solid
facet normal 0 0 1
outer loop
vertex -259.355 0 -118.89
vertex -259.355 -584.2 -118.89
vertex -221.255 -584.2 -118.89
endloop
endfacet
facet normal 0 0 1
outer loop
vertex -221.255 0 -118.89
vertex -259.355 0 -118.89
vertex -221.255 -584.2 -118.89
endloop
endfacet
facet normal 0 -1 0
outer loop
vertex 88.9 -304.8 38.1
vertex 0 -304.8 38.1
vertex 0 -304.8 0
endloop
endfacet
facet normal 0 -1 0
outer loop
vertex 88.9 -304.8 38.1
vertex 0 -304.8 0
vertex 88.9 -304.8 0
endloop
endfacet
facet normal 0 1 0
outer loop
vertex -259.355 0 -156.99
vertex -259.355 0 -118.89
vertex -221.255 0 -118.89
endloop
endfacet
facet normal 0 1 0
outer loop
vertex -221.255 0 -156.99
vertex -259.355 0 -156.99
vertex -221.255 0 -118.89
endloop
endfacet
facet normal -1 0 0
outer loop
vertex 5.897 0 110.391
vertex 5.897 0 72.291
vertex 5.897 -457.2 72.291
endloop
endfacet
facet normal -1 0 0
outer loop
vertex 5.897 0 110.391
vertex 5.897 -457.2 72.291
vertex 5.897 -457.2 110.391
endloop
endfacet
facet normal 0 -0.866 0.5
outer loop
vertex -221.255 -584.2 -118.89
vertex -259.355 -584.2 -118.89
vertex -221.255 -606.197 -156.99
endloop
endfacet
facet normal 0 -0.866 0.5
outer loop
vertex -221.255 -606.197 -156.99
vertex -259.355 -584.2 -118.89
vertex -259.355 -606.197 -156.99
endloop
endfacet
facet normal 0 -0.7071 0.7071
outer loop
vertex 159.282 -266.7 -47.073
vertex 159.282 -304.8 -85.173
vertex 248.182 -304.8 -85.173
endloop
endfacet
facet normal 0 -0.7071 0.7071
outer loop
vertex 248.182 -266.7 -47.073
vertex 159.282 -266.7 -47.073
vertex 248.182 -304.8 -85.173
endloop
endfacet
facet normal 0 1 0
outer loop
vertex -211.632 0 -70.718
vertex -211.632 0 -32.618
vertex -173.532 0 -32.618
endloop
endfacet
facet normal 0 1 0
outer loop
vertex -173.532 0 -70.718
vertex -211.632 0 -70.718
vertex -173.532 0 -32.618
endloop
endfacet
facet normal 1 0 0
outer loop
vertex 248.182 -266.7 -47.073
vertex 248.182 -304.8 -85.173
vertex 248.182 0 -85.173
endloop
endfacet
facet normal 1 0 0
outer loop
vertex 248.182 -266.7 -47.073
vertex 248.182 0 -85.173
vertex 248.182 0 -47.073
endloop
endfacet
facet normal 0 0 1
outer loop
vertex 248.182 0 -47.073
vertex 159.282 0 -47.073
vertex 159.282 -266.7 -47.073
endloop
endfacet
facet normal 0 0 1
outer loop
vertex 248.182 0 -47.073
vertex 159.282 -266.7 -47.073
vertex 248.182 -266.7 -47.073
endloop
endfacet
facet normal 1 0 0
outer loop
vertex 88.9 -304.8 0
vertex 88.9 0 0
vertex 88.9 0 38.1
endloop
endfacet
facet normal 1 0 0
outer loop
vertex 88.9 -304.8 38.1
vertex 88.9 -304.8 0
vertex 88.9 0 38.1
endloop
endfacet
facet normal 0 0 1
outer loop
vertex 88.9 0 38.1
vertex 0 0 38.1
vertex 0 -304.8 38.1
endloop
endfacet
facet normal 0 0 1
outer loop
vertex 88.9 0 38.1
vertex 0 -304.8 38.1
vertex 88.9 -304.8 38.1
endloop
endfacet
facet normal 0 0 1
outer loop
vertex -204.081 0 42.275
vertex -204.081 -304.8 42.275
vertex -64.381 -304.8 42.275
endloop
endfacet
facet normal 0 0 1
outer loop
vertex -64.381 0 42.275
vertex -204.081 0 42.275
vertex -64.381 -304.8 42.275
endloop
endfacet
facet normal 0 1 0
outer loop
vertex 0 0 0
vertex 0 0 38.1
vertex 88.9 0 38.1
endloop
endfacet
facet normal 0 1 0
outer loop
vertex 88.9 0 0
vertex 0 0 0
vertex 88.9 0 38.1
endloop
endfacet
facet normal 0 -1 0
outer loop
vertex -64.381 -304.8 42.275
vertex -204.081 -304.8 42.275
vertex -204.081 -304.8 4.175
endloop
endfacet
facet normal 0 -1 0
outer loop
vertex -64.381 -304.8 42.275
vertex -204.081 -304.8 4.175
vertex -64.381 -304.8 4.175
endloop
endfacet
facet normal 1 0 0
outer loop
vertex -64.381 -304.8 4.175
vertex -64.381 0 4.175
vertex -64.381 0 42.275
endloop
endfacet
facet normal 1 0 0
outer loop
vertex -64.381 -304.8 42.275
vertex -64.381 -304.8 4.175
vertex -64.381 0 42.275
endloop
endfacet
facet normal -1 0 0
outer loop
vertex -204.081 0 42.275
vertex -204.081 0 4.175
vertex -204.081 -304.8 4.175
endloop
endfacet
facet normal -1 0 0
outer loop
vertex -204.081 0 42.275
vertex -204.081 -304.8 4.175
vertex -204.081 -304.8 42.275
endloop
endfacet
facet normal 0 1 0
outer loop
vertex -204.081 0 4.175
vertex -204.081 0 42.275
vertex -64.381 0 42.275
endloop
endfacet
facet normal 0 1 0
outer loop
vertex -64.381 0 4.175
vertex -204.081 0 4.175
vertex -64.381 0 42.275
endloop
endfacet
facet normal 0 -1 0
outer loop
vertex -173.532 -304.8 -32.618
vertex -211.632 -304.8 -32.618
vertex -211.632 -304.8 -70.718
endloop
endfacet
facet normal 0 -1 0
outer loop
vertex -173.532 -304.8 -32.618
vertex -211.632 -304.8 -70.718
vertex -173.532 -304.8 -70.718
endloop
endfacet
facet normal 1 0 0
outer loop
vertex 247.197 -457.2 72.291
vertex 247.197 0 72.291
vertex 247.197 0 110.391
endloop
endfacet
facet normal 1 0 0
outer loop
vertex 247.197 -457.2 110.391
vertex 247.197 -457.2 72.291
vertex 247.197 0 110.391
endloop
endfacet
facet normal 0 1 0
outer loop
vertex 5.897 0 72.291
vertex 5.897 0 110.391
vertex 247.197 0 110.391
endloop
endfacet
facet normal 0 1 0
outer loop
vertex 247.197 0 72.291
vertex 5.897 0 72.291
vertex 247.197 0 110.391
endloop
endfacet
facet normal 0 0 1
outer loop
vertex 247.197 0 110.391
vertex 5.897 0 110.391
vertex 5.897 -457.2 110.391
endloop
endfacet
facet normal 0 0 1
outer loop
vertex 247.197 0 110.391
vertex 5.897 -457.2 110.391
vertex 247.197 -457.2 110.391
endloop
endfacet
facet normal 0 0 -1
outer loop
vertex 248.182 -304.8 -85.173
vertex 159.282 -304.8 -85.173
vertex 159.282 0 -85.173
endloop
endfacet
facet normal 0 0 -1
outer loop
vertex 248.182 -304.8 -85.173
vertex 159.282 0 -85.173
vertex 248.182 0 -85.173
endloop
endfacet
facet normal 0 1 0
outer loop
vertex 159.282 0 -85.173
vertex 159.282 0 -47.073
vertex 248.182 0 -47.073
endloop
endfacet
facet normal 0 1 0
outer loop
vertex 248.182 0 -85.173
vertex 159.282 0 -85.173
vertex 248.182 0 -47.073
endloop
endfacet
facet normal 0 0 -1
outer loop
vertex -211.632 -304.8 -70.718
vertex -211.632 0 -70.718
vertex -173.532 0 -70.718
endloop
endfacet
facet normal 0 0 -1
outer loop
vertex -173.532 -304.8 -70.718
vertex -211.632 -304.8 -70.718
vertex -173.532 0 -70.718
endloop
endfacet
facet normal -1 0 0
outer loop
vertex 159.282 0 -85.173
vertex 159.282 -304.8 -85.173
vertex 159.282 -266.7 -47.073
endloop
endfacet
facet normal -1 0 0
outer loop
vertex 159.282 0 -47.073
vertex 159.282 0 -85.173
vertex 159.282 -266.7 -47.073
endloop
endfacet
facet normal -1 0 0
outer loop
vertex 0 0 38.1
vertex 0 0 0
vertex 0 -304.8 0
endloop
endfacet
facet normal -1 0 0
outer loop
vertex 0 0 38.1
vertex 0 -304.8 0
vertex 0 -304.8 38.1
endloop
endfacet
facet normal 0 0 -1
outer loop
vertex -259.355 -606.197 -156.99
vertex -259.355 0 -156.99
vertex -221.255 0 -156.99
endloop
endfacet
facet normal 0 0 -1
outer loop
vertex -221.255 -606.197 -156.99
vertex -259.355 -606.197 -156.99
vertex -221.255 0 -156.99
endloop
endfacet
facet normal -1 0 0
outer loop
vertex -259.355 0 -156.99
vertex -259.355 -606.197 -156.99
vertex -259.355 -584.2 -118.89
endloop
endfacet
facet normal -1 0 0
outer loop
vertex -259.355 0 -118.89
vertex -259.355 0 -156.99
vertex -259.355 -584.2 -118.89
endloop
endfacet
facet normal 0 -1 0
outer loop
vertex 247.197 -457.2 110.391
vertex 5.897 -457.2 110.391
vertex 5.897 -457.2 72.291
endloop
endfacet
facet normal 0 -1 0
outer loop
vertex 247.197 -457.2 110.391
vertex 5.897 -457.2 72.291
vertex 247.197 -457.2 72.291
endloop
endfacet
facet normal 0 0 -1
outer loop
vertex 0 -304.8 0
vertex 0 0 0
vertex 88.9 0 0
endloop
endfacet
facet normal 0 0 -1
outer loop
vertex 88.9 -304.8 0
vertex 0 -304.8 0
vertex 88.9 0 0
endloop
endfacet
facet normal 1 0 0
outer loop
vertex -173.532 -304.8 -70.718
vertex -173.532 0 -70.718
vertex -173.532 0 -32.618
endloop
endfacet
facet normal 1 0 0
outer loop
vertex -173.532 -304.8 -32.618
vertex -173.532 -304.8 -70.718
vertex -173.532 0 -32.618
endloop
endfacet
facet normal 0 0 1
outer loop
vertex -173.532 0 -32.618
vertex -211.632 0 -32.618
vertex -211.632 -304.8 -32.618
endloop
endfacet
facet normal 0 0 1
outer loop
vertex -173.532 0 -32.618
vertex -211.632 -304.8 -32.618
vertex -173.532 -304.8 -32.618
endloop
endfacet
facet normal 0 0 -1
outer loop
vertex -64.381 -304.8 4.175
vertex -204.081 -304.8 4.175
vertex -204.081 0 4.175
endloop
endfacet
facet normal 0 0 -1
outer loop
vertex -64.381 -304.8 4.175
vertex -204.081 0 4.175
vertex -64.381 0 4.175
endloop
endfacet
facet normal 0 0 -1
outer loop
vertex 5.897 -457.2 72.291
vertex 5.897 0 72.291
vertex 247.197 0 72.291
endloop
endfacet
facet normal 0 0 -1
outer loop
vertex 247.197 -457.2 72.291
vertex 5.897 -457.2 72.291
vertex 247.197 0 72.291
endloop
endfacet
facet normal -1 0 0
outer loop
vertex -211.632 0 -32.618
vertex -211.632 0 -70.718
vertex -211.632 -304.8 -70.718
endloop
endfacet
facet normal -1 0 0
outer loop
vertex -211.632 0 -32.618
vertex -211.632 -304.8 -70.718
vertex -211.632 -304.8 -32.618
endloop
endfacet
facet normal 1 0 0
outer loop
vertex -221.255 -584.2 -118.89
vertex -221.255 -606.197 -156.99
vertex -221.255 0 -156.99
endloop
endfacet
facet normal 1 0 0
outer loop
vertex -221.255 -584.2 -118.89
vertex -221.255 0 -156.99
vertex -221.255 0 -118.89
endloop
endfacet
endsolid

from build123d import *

# Parameters (mm, degrees)
F0_W         = 88.9
F0_H         = 38.1
F1_DEPTH     = 304.8
F3_W         = 139.7
F3_H         = 38.1
F4_DEPTH     = 304.8
F6_W         = 241.3
F6_H         = 38.1
F7_DEPTH     = 457.2
F8_W         = 38.1
F8_H         = 38.1
F9_DEPTH     = 304.8
F10_W        = 88.9
F10_H        = 38.1
F11_DEPTH    = 304.8
F12_SIZE     = 38.09999
F13_W        = 38.1
F13_H        = 38.1
F14_DEPTH    = 609.6
F15_T1_DEPTH = 265.7329697057


# Not quite as in the source:
# - a fillet or chamfer that OpenCascade refuses, or shapes differently, is made with other operations: its cross-section is extruded or revolved along the edge and cut away or added
# - a fillet or chamfer is up to 0.001 mm smaller than in the source, because OpenCascade refuses the exact size


with BuildPart() as f1:
    # F0 (on Front) → F1 (new body)
    with BuildSketch(Plane.XZ):
        with Locations((44.45, 19.05)):
            Rectangle(F0_W, F0_H)
    extrude(amount=F1_DEPTH)


with BuildPart() as f2_1:
    # F2: copy of F1
    add(f1.part.moved(Location((127, 0, 0))))


with BuildPart() as f4:
    # F3 (on Front) → F4 (new body)
    with BuildSketch(Plane.XZ):
        with Locations((-134.2311747432, 23.224890928)):
            Rectangle(F3_W, F3_H)
    extrude(amount=F4_DEPTH)


with BuildPart() as f7:
    # F6 (on Front) → F7 (new body)
    with BuildSketch(Plane.XZ):
        with Locations((126.5473598003, 91.3414934158)):
            Rectangle(F6_W, F6_H)
    extrude(amount=F7_DEPTH)


with BuildPart() as f9:
    # F8 (on Front) → F9 (new body)
    with BuildSketch(Plane.XZ):
        with Locations((-192.5818750143, -51.6675061107)):
            Rectangle(F8_W, F8_H)
    extrude(amount=F9_DEPTH)


with BuildPart() as f11:
    # F10 (on Front) → F11 (new body)
    with BuildSketch(Plane.XZ):
        with Locations((203.7315069914, -66.1231598377)):
            Rectangle(F10_W, F10_H)
    extrude(amount=F11_DEPTH)

    # F12 (size 38.1 in the source; OpenCascade refuses exactly that, so slightly less here)
    f12_edges = [f11.edges().sort_by_distance(p)[0] for p in [
        (203.731507, -304.8, -47.07316),
    ]]
    chamfer(f12_edges, length=F12_SIZE)


with BuildPart() as f14:
    # F13 (on Front) → F14 (new body)
    with BuildSketch(Plane.XZ):
        with Locations((-240.3054216385, -137.9403641939)):
            Rectangle(F13_W, F13_H)
    extrude(amount=F14_DEPTH)

    # F15: chamfer of 25.4 x 43.9940905122 on 1 edges, made by hand

    # F15_s2 → F15_t1 (cut)
    with BuildSketch(Plane.YZ.offset(-373.1719064913)):
        Polygon((-584.2, -118.8903641939), (-609.6, -162.8844547062), (-609.6, -118.8903641939), align=None)
    extrude(amount=F15_T1_DEPTH, mode=Mode.SUBTRACT)


solid = Compound([f1.part, f4.part, f7.part, f9.part, f11.part, f14.part])
